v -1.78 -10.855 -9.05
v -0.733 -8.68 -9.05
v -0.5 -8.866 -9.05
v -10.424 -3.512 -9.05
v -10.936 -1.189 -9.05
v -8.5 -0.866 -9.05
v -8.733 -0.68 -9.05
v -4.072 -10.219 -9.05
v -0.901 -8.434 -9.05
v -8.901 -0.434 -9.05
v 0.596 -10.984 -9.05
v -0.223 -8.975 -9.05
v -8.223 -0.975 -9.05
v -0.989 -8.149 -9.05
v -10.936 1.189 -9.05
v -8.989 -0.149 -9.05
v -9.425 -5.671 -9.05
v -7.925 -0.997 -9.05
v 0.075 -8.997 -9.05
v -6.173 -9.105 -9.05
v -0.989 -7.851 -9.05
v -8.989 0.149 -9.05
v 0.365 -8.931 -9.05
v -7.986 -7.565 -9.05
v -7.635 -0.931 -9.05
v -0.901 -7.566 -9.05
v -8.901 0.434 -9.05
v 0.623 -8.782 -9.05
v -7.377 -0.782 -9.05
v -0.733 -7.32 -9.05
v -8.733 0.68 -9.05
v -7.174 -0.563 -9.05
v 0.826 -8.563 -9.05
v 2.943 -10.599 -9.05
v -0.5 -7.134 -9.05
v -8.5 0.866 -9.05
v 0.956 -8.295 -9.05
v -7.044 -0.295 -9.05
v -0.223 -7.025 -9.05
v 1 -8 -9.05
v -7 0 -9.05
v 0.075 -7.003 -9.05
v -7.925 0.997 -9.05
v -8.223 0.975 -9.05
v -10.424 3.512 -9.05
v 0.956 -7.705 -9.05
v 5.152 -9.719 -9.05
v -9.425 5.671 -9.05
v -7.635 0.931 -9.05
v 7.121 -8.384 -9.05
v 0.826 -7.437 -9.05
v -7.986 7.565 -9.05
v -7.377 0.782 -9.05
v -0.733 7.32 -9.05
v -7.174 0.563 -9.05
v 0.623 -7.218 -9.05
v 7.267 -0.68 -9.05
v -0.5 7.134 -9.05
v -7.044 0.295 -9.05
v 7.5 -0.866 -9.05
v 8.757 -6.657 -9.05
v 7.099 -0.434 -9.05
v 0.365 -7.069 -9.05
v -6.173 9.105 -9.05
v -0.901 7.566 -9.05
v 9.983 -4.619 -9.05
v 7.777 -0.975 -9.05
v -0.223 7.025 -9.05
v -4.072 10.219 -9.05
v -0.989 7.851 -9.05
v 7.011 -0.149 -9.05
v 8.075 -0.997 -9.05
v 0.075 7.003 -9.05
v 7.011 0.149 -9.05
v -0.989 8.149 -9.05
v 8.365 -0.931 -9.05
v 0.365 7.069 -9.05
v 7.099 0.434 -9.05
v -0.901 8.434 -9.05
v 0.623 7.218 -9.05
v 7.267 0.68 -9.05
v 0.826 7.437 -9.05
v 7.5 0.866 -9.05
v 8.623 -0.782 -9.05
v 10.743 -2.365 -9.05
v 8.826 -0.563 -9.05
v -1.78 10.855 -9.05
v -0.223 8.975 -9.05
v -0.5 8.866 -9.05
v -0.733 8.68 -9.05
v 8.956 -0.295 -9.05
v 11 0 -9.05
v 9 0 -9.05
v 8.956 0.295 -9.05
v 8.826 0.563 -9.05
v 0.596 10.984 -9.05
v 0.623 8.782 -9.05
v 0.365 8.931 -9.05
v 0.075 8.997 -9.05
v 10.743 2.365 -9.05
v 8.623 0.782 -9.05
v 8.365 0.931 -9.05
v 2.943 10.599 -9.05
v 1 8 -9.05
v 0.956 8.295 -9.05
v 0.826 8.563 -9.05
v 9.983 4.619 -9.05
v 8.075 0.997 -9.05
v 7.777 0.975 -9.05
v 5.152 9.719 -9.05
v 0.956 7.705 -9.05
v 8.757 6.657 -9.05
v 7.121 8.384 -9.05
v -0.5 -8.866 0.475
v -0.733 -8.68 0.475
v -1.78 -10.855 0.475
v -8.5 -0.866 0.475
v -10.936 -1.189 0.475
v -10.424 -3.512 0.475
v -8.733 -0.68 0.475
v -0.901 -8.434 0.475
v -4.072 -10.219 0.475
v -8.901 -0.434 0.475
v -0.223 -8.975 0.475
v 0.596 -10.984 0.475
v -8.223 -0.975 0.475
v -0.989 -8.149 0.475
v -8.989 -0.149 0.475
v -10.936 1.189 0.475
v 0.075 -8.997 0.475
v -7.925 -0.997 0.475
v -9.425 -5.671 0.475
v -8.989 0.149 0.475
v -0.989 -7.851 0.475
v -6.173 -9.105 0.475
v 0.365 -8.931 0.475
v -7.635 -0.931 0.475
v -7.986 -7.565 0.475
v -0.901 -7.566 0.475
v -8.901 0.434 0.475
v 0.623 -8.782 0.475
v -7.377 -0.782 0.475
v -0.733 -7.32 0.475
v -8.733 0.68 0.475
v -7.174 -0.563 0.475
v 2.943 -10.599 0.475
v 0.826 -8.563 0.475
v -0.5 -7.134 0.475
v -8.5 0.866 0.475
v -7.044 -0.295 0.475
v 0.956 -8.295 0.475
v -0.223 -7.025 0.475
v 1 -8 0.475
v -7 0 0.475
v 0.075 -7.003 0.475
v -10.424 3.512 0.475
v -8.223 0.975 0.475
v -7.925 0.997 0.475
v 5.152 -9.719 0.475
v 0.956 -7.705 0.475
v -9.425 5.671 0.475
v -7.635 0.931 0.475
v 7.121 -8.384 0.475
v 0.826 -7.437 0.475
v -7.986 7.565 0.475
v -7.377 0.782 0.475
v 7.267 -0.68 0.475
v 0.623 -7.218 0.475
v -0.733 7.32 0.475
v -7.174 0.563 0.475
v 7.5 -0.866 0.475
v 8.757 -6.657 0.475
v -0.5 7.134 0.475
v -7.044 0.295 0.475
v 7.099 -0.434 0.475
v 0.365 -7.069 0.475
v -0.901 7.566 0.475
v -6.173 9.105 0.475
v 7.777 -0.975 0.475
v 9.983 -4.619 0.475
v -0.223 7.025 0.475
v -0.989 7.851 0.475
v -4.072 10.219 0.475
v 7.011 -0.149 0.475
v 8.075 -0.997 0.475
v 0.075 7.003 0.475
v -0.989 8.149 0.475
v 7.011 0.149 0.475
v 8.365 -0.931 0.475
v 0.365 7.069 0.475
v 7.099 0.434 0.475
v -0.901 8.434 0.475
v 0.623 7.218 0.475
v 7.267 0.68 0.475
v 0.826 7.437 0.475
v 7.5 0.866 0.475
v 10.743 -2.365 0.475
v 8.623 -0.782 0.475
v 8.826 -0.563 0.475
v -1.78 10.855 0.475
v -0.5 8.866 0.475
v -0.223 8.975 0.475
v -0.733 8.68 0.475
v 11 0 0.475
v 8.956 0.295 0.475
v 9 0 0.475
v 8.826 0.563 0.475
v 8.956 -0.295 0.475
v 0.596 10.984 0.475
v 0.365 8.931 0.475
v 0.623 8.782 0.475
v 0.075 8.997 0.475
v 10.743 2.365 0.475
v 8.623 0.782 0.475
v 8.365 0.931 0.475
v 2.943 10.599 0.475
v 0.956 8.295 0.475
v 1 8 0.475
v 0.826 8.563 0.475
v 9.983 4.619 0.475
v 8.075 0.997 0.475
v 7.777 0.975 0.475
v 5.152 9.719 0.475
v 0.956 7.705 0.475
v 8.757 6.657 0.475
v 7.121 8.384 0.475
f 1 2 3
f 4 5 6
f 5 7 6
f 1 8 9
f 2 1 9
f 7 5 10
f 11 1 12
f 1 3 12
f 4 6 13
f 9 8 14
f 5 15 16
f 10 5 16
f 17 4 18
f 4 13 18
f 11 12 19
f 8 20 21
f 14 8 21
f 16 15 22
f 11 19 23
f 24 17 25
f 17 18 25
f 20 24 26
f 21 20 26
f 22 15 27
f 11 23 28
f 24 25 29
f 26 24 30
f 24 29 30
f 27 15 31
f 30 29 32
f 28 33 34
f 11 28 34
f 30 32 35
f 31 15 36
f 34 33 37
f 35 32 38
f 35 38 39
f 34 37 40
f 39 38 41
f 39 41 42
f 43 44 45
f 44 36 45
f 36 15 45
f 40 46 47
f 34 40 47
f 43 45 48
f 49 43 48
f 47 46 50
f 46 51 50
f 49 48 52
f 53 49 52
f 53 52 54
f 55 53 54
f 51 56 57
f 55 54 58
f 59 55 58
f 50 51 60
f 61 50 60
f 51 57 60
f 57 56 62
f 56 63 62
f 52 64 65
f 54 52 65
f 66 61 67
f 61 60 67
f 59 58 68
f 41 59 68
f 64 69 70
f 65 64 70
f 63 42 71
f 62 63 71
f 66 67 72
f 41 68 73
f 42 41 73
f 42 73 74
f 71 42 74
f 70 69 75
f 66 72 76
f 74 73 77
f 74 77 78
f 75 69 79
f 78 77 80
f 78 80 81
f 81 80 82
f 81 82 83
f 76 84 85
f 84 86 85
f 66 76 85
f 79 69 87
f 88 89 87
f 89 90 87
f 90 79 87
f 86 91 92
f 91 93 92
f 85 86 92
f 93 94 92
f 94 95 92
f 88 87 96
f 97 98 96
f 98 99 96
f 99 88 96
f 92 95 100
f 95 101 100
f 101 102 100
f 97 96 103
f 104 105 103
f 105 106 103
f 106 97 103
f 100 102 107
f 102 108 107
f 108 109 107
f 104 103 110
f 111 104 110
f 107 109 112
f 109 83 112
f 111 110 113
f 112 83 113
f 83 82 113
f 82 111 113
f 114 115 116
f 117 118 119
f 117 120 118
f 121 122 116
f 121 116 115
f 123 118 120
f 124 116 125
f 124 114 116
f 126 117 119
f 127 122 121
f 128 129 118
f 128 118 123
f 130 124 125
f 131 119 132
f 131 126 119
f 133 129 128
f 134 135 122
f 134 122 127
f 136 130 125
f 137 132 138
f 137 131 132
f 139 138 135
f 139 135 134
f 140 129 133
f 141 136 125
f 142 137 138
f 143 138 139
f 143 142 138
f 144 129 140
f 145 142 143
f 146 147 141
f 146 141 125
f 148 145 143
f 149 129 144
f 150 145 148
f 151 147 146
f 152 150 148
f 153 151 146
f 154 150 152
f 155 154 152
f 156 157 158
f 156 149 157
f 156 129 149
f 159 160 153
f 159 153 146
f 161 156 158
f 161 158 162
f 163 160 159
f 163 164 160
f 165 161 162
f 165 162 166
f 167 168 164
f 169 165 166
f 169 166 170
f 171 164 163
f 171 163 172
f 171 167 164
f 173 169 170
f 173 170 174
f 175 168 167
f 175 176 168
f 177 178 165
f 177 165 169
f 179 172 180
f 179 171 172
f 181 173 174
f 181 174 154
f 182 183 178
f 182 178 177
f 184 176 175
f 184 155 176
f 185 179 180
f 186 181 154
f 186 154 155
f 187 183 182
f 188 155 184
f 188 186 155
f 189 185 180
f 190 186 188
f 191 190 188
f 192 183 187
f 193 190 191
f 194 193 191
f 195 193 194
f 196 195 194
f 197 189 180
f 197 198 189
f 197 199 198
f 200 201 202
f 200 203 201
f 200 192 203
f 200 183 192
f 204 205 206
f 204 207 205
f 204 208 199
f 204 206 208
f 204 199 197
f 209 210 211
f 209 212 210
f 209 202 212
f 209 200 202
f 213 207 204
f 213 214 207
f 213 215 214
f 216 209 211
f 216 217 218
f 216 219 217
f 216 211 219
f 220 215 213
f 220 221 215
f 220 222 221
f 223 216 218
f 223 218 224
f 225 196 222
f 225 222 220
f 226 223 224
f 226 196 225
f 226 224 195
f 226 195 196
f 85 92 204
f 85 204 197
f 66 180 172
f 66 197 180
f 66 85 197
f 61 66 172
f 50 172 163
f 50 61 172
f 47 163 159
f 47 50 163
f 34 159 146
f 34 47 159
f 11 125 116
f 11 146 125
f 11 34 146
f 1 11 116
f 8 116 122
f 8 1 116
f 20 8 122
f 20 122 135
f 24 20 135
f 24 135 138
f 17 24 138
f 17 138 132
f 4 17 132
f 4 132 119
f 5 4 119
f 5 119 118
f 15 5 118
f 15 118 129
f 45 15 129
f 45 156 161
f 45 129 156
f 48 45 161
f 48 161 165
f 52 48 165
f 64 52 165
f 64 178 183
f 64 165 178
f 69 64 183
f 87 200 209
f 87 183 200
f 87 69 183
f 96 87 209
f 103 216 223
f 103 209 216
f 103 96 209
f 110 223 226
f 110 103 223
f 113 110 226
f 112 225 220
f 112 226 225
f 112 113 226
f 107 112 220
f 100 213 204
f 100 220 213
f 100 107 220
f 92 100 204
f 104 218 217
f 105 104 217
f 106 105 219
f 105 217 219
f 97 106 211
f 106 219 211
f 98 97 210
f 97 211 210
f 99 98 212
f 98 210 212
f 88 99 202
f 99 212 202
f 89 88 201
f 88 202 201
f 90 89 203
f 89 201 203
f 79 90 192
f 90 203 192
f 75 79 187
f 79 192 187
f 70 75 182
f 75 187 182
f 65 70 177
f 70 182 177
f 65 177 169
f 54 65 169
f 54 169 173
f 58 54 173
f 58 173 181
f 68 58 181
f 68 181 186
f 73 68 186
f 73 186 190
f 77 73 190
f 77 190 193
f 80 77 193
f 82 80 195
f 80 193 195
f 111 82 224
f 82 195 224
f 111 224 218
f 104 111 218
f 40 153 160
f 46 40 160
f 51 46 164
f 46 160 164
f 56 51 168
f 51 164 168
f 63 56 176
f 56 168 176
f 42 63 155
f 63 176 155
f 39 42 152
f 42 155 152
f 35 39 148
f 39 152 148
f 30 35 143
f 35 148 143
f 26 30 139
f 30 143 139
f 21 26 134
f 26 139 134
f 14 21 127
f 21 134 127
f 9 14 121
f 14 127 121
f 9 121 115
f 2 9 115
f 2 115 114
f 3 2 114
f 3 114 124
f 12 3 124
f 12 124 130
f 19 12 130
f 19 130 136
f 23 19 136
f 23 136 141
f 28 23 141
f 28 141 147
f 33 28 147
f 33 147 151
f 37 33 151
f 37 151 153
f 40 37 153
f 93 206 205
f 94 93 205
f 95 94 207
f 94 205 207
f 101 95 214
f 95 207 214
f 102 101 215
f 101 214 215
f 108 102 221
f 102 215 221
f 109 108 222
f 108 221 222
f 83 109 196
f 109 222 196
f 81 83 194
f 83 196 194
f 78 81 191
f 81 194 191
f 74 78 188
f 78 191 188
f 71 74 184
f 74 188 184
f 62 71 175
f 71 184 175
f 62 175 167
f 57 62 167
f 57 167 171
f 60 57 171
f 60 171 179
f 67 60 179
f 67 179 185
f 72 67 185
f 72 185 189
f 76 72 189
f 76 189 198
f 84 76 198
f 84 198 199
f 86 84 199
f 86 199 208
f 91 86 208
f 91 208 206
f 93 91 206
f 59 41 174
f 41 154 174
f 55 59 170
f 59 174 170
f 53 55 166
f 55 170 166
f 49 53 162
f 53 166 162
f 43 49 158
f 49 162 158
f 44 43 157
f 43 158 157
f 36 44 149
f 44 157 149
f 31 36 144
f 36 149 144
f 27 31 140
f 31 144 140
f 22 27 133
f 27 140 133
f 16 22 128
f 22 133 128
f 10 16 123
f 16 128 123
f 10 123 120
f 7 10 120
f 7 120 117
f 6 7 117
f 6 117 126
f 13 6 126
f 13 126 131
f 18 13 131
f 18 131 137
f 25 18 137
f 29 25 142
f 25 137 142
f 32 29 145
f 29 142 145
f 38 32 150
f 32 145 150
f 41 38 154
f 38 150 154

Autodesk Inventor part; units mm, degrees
ref_plane "YZ Plane" through (0, 0, 0) normal (1, 0, 0) x (0, 1, 0)
ref_plane "XZ Plane" through (0, 0, 0) normal (0, 1, 0) x (-1, 0, 0)
ref_plane "XY Plane" through (0, 0, 0) normal (0, 0, 1) x (1, 0, 0)
sketch "Sketch1" plane through (0, 0, 0) normal (0, 0, 1) x (1, 0, 0)
  circle A0 centre (0, 0) radius 11
  dimension "d0" = 22
extrude "Extrusion1" add sketch "Sketch1" along normal blind 10
sketch "Sketch2" plane through (0, 0, 10) normal (0, 0, 1) x (1, 0, 0)
  circle A0 centre (0, 0) radius 11 projected
  circle A1 centre (0, 0) radius 8
  circle A2 centre (-8, 0) radius 1
  circle A3 centre (0, 8) radius 1
  circle A4 centre (8, 0) radius 1
  circle A5 centre (0, -8) radius 1
  dimension "d3" = 16
  dimension "d4" = 2
  dimension "d5" = 2
  dimension "d6" = 2
  dimension "d7" = 2
extrude "Extrusion2" cut sketch "Sketch2" against normal blind 10 contours A1 A4 | A1 A4 | A3 A1 | A1 A3 | A5 A1 | A1 A5 | A2 A1 | A1 A2
sketch "Sketch3" plane through (0, 0, 10) normal (0, 0, 1) x (1, 0, 0)
  circle A0 centre (8, 0) radius 1 projected
  circle A1 centre (0, -8) radius 1 projected
  circle A2 centre (-8, 0) radius 1 projected
  circle A3 centre (0, 8) radius 1 projected
  circle A4 centre (0, 0) radius 11 projected
extrude "Extrusion3" cut sketch "Sketch3" against normal blind 9.525
sketch "Sketch4" plane through (0, 0, 0.475) normal (0, 0, 1) x (1, 0, 0)
  circle A0 centre (0, 8) radius 1 projected
  circle A1 centre (-8, 0) radius 1 projected
  circle A2 centre (0, -8) radius 1 projected
  circle A3 centre (8, 0) radius 1 projected
  circle A4 centre (0, 0) radius 11 projected
extrude "Extrusion4" add sketch "Sketch4" against normal blind 9.525
properties part number "Spacer"
